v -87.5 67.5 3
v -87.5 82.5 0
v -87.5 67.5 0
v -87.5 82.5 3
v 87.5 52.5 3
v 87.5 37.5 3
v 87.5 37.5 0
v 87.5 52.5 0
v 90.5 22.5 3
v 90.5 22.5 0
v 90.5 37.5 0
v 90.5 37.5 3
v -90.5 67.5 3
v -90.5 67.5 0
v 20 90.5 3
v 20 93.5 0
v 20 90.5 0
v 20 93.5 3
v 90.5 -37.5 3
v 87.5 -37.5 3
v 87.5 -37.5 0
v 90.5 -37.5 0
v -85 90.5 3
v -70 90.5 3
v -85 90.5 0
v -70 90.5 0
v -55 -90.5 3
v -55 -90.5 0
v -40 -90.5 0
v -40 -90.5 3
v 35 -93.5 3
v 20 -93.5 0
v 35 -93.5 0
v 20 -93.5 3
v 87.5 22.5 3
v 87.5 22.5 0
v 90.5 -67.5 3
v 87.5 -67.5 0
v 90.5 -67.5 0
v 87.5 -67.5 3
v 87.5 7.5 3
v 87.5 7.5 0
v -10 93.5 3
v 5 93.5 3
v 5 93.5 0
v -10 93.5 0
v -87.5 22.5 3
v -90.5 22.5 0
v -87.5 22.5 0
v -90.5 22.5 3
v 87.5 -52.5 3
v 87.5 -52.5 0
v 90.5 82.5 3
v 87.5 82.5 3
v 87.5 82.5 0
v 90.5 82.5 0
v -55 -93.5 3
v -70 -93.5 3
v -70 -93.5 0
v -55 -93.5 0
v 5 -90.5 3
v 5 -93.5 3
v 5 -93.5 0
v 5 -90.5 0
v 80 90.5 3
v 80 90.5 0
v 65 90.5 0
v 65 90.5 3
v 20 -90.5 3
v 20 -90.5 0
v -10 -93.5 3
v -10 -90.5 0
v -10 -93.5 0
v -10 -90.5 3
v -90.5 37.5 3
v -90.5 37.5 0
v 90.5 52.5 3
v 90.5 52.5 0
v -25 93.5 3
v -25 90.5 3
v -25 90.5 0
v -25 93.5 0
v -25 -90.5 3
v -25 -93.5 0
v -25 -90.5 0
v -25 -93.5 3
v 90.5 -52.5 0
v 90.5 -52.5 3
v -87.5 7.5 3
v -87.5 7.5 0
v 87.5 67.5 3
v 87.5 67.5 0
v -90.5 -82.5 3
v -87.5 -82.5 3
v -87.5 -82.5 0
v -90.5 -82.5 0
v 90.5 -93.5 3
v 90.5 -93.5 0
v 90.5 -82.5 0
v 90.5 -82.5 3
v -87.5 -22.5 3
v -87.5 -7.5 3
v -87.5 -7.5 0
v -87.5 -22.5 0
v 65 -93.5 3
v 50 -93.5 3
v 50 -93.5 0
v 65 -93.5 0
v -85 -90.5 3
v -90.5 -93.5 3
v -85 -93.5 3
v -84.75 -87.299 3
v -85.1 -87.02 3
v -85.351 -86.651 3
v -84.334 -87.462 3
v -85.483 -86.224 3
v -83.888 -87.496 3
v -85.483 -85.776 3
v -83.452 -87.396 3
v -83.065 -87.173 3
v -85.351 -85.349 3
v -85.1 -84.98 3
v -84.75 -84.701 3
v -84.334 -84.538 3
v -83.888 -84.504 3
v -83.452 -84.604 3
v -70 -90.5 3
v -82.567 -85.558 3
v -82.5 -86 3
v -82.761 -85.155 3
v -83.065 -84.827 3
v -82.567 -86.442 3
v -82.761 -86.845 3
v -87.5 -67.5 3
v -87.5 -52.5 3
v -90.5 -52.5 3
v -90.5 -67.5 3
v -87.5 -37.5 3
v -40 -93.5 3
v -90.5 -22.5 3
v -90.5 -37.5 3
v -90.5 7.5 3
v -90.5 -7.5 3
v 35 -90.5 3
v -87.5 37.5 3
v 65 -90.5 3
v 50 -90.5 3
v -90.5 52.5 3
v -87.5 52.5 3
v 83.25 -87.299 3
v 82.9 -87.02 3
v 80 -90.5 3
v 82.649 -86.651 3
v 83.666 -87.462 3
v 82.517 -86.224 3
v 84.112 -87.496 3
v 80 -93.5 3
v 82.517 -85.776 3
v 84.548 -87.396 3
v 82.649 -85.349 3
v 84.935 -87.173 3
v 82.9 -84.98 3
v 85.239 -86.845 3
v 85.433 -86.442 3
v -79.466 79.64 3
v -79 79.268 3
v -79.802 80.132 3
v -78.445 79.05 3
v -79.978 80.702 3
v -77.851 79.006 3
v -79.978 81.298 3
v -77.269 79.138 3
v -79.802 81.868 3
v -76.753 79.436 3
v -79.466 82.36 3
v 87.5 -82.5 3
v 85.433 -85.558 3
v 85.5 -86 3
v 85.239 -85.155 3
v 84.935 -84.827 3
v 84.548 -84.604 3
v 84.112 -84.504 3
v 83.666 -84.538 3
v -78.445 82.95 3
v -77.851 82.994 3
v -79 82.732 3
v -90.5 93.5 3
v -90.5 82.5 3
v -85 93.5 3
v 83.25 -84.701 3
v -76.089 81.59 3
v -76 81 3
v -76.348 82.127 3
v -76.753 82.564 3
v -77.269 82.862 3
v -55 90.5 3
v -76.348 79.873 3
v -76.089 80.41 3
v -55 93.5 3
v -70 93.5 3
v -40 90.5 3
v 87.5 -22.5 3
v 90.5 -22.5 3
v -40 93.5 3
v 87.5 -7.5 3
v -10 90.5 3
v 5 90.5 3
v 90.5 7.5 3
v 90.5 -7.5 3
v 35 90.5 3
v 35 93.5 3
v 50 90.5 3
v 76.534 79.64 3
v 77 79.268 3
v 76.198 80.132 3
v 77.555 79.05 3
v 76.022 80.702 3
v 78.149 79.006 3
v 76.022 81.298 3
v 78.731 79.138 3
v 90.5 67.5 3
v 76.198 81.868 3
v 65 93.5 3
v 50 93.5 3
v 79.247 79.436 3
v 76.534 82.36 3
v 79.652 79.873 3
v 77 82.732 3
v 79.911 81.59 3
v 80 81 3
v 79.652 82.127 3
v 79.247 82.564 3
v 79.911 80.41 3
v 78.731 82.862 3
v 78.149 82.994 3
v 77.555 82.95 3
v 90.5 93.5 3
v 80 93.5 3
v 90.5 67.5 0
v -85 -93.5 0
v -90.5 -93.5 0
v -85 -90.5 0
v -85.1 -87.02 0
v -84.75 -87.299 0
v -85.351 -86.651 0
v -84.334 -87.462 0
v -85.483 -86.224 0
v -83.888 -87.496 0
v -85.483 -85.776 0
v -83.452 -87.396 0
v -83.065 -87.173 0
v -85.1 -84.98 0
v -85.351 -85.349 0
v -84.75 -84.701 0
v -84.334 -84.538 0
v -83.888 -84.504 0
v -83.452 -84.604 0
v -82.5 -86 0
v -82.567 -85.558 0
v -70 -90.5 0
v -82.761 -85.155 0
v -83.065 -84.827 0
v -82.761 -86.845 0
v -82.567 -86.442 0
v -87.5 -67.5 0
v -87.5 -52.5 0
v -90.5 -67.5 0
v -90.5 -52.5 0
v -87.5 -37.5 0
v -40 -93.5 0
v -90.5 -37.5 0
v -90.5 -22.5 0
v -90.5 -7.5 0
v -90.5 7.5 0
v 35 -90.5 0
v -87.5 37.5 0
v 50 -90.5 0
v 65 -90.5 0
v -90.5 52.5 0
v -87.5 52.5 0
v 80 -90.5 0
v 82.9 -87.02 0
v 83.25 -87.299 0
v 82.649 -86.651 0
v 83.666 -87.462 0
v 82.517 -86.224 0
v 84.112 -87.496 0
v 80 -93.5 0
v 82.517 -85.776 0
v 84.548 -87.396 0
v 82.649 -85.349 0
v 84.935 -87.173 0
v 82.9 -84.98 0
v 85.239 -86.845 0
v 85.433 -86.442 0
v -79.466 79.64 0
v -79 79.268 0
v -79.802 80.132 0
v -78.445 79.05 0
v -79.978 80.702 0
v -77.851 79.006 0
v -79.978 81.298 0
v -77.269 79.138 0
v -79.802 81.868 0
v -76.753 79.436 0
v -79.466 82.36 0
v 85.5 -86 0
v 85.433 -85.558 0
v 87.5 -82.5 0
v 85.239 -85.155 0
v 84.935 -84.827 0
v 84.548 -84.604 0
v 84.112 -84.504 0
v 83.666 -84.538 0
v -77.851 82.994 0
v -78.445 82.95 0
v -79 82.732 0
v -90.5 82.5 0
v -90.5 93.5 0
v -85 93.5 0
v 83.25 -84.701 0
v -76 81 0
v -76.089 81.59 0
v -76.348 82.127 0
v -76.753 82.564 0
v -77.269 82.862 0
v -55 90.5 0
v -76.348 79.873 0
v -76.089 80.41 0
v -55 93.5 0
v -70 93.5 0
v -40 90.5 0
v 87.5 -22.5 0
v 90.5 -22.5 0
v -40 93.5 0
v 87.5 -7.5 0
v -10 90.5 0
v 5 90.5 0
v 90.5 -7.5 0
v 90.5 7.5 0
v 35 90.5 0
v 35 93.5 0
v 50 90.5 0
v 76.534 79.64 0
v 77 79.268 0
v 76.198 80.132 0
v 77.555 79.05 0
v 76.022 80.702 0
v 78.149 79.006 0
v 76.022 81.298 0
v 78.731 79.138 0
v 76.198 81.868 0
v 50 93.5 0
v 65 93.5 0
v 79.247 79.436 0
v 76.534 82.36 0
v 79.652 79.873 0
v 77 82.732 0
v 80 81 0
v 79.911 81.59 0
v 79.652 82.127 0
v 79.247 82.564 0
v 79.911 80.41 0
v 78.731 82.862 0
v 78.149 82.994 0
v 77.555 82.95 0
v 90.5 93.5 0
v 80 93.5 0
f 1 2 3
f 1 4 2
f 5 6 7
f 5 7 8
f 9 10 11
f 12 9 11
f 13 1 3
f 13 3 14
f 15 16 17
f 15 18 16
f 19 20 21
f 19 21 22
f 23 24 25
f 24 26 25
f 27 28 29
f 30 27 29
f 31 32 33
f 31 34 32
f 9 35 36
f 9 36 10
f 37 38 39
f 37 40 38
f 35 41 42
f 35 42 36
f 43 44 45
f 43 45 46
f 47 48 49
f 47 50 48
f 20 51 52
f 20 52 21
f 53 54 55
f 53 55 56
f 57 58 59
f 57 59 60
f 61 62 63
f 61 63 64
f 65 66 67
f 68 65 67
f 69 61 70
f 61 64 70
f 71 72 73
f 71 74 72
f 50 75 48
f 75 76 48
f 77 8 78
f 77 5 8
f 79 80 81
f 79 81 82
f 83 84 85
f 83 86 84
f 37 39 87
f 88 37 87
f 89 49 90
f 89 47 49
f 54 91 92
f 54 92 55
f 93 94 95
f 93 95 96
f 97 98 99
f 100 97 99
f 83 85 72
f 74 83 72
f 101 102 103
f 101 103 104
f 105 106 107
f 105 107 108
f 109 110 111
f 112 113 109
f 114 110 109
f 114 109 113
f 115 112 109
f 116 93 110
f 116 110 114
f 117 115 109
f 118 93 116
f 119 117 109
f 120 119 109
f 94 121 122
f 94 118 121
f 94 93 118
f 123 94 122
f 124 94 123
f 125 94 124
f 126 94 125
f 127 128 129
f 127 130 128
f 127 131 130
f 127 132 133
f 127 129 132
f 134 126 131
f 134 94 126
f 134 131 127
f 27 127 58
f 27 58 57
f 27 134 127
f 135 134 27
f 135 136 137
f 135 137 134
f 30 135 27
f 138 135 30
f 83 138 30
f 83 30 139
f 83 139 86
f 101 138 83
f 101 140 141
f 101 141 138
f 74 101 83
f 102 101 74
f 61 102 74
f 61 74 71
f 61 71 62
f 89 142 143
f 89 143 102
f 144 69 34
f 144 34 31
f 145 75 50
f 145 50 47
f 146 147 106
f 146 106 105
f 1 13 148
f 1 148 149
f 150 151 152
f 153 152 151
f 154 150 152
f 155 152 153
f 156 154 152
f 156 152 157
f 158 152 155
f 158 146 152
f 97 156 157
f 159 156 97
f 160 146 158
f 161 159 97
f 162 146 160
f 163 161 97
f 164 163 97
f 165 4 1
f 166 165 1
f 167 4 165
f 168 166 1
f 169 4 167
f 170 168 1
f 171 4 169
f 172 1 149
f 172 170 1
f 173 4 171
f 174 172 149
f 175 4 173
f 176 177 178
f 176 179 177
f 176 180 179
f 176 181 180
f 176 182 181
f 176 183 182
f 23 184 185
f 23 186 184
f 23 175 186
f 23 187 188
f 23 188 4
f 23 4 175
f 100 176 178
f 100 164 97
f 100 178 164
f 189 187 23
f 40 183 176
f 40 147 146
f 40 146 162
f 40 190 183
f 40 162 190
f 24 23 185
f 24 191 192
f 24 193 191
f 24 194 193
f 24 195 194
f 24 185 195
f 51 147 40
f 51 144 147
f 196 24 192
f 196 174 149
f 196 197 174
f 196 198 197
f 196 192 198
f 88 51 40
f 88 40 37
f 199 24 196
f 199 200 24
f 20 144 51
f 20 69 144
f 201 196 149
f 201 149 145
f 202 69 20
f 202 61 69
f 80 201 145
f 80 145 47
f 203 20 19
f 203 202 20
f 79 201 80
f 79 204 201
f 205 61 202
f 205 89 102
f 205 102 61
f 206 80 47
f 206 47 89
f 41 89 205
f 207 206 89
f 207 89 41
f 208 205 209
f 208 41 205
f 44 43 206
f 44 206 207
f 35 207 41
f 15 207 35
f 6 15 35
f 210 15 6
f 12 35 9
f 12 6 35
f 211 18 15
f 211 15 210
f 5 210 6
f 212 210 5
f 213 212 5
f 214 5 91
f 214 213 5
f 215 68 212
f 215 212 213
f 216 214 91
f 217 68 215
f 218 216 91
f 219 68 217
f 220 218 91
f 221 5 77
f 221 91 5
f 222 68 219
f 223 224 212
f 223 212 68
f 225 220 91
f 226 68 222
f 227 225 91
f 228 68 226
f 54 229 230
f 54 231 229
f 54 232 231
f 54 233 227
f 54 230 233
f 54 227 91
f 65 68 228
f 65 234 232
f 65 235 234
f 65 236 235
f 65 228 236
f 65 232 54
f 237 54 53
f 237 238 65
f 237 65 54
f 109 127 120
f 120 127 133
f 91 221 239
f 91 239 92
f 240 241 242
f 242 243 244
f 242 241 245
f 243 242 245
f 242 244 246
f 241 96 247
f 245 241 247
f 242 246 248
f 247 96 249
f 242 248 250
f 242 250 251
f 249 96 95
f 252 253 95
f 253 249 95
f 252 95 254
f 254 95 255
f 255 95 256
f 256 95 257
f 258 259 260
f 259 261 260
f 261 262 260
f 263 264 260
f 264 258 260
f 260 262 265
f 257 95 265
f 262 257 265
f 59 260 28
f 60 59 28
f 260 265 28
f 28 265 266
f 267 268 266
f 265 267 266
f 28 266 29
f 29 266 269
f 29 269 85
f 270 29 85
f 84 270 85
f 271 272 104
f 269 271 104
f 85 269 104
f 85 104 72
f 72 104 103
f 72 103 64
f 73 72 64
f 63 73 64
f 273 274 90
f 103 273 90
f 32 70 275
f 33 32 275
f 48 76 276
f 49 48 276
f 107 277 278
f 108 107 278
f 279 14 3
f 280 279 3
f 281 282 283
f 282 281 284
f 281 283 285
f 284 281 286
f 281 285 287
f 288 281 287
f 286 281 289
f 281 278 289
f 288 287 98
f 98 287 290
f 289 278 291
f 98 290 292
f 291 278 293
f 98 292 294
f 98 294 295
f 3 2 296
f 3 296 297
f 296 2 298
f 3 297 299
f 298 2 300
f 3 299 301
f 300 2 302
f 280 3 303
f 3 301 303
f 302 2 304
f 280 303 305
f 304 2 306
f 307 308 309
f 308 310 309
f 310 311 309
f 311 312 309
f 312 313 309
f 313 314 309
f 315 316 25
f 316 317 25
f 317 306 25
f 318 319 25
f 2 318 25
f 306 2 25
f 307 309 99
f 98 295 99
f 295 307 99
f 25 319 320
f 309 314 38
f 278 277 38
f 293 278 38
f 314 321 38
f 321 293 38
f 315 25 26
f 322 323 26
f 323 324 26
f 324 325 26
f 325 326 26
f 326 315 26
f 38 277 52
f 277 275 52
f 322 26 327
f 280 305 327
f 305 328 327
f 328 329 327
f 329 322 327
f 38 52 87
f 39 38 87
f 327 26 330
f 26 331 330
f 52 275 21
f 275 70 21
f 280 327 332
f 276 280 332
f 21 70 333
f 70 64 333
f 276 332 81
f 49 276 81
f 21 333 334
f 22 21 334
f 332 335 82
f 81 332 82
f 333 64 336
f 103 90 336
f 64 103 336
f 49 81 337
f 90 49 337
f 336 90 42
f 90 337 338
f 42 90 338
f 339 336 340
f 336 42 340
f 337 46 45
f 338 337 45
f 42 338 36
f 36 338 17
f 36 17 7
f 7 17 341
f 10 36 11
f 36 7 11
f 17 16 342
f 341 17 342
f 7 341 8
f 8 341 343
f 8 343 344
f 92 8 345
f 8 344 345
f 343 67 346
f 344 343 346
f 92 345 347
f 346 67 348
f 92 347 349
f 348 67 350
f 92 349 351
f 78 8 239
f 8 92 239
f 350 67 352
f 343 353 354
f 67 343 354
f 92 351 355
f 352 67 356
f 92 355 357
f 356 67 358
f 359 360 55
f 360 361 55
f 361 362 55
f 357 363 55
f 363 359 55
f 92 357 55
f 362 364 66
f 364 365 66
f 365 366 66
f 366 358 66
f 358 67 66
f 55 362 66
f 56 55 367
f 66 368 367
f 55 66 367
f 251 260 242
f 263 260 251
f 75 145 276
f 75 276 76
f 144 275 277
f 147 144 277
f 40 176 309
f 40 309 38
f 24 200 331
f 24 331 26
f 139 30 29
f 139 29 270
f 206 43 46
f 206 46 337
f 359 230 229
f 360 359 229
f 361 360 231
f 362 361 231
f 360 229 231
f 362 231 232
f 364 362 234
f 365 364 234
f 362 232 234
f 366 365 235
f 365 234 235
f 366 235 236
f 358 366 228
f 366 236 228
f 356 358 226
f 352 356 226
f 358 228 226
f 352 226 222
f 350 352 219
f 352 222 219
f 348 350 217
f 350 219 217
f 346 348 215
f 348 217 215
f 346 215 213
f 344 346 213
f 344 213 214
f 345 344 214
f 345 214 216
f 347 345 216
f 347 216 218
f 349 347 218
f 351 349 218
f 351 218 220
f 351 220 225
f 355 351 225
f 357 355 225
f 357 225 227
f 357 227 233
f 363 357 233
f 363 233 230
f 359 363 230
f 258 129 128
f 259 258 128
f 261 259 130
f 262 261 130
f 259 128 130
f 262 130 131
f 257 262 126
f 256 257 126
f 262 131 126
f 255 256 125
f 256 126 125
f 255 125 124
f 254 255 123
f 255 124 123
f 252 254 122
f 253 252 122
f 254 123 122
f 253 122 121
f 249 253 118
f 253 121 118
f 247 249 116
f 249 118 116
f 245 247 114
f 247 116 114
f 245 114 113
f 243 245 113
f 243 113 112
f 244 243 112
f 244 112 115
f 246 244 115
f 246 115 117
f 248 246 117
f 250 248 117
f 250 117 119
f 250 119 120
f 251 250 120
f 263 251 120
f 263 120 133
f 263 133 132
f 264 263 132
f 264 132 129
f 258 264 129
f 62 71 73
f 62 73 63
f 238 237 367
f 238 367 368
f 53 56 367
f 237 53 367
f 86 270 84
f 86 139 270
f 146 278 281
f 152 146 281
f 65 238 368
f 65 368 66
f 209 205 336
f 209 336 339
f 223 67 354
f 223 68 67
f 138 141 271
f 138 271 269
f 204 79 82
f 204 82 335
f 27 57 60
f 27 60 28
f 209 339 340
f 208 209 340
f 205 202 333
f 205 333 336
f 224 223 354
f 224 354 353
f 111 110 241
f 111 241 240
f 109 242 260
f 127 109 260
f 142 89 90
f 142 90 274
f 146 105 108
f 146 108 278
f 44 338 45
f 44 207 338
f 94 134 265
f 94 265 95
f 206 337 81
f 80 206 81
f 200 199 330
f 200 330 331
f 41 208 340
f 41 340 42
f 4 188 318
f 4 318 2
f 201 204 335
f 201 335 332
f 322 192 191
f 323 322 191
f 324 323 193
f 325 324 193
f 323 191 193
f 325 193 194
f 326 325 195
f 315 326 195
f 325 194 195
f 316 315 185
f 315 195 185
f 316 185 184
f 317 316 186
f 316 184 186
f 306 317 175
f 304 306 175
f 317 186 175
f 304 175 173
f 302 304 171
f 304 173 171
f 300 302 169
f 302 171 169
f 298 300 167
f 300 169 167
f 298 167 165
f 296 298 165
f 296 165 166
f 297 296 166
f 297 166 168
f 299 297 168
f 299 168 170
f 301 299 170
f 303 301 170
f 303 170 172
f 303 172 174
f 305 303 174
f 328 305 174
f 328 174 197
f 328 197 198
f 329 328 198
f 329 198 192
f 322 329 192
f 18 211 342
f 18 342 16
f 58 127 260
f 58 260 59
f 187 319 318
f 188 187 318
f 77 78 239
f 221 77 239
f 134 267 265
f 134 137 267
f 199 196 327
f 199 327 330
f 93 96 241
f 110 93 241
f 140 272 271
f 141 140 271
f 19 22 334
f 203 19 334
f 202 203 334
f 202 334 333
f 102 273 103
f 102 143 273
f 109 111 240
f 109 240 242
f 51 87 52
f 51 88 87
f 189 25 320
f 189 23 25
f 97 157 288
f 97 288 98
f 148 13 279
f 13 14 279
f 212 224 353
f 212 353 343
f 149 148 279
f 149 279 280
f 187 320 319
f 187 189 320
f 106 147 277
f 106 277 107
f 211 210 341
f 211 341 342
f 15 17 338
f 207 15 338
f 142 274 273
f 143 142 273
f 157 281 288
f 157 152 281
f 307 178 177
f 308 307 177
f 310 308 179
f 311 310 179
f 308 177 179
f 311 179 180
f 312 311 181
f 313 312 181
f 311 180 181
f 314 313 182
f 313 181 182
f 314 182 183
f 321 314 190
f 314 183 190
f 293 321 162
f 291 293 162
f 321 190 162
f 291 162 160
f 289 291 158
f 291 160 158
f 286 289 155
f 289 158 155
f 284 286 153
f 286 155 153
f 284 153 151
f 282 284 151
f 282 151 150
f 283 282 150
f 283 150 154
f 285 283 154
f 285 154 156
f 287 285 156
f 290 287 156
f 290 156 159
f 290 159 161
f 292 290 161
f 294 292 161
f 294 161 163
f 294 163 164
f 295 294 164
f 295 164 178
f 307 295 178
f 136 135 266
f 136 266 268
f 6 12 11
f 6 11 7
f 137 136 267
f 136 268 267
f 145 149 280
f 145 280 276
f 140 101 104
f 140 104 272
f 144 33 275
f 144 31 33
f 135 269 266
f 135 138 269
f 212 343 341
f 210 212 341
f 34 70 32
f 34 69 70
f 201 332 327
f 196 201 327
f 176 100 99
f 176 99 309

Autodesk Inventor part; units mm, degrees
ref_plane "YZ Plane" through (0, 0, 0) normal (1, 0, 0) x (0, 1, 0)
ref_plane "XZ Plane" through (0, 0, 0) normal (0, 1, 0) x (-1, 0, 0)
ref_plane "XY Plane" through (0, 0, 0) normal (0, 0, 1) x (1, 0, 0)
sketch "Sketch1" plane through (0, 0, 0) normal (0, 0, 1) x (1, 0, 0)
  line L0 (-90.5, -90.5) -> (90.5, -90.5)
  line L1 (90.5, -90.5) -> (90.5, 90.5)
  line L2 (90.5, 90.5) -> (-90.5, 90.5)
  line L3 (-90.5, 90.5) -> (-90.5, -90.5)
  line L4 (-90.5, -90.5) -> (90.5, 90.5) construction
  line L5 (90.5, -90.5) -> (-90.5, 90.5) construction
  point P0 (0, 0)
  dimension "d0" = 181
  dimension "d1" = 181
extrude "Extrusion1" add sketch "Sketch1" along normal blind 3
sketch "Sketch2" plane through (0, 0, 3) normal (0, 0, 1) x (1, 0, 0)
  line L0 (90.5, 90.5) -> (-90.5, 90.5) projected
  line L1 (-90.5, 90.5) -> (-85, 90.5)
  line L2 (-85, 90.5) -> (-85, 93.5)
  line L3 (-85, 93.5) -> (-90.5, 93.5)
  line L4 (-90.5, 93.5) -> (-90.5, 90.5)
  line L5 (80, 90.5) -> (85.5, 90.5)
  line L6 (85.5, 90.5) -> (85.5, 93.5)
  line L7 (85.5, 93.5) -> (80, 93.5)
  line L8 (80, 93.5) -> (80, 90.5)
  line L9 (-90.5, -93.5) -> (-85, -93.5)
  line L10 (-85, -93.5) -> (-85, -90.5)
  line L11 (-85, -90.5) -> (-90.5, -90.5)
  line L12 (-90.5, -90.5) -> (-90.5, -93.5)
  line L13 (80, -93.5) -> (85.5, -93.5)
  line L14 (85.5, -93.5) -> (85.5, -90.5)
  line L15 (85.5, -90.5) -> (80, -90.5)
  line L16 (80, -90.5) -> (80, -93.5)
  line L17 (-70, 90.5) -> (-55, 90.5)
  line L18 (-55, 90.5) -> (-55, 93.5)
  line L19 (-55, 93.5) -> (-70, 93.5)
  line L20 (-70, 93.5) -> (-70, 90.5)
  line L21 (-25, 90.5) -> (-25, 93.5)
  line L22 (-40, 90.5) -> (-25, 90.5)
  line L23 (-25, 93.5) -> (-40, 93.5)
  line L24 (-40, 93.5) -> (-40, 90.5)
  line L25 (5, 90.5) -> (5, 93.5)
  line L26 (-10, 90.5) -> (5, 90.5)
  line L27 (5, 93.5) -> (-10, 93.5)
  line L28 (-10, 93.5) -> (-10, 90.5)
  line L29 (35, 90.5) -> (35, 93.5)
  line L30 (20, 90.5) -> (35, 90.5)
  line L31 (35, 93.5) -> (20, 93.5)
  line L32 (20, 93.5) -> (20, 90.5)
  line L33 (65, 90.5) -> (65, 93.5)
  line L34 (50, 90.5) -> (65, 90.5)
  line L35 (65, 93.5) -> (50, 93.5)
  line L36 (50, 93.5) -> (50, 90.5)
  line L37 (-55, -93.5) -> (-55, -90.5)
  line L38 (-70, -93.5) -> (-55, -93.5)
  line L39 (-55, -90.5) -> (-70, -90.5)
  line L40 (-70, -90.5) -> (-70, -93.5)
  line L41 (-25, -93.5) -> (-25, -90.5)
  line L42 (-40, -93.5) -> (-25, -93.5)
  line L43 (-25, -90.5) -> (-40, -90.5)
  line L44 (-40, -90.5) -> (-40, -93.5)
  line L45 (5, -93.5) -> (5, -90.5)
  line L46 (-10, -93.5) -> (5, -93.5)
  line L47 (5, -90.5) -> (-10, -90.5)
  line L48 (-10, -90.5) -> (-10, -93.5)
  line L49 (35, -93.5) -> (35, -90.5)
  line L50 (20, -93.5) -> (35, -93.5)
  line L51 (35, -90.5) -> (20, -90.5)
  line L52 (20, -90.5) -> (20, -93.5)
  line L53 (65, -93.5) -> (65, -90.5)
  line L54 (50, -93.5) -> (65, -93.5)
  line L55 (65, -90.5) -> (50, -90.5)
  line L56 (50, -90.5) -> (50, -93.5)
  point P0 (0, 0)
  dimension "d4" = 5.5
  dimension "d5" = 3
  dimension "d8" = 170.5
  dimension "d11" = 184
  dimension "d14" = 15
  dimension "d15" = 3
  dimension "d16" = 15
  dimension "d19" = 30
  dimension "d22" = 184
extrude "Extrusion2" add sketch "Sketch2" against normal blind 3
sketch "Sketch3" plane through (0, 0, 3) normal (0, 0, 1) x (1, 0, 0)
  line L0 (-90.5, 93.5) -> (-90.5, -93.5) projected
  line L1 (-90.5, 82.5) -> (-87.5, 82.5)
  line L2 (-87.5, 82.5) -> (-87.5, 67.5)
  line L3 (-87.5, 67.5) -> (-90.5, 67.5)
  line L4 (-90.5, 67.5) -> (-90.5, 82.5)
  line L5 (-85, 93.5) -> (-90.5, 93.5) projected
  line L6 (-90.5, 52.5) -> (-87.5, 52.5)
  line L7 (-87.5, 52.5) -> (-87.5, 37.5)
  line L8 (-87.5, 37.5) -> (-90.5, 37.5)
  line L9 (-90.5, 37.5) -> (-90.5, 52.5)
  line L10 (-90.5, 22.5) -> (-87.5, 22.5)
  line L11 (-87.5, 22.5) -> (-87.5, 7.5)
  line L12 (-87.5, 7.5) -> (-90.5, 7.5)
  line L13 (-90.5, 7.5) -> (-90.5, 22.5)
  line L14 (-90.5, -7.5) -> (-87.5, -7.5)
  line L15 (-87.5, -7.5) -> (-87.5, -22.5)
  line L16 (-87.5, -22.5) -> (-90.5, -22.5)
  line L17 (-90.5, -22.5) -> (-90.5, -7.5)
  line L18 (-90.5, -37.5) -> (-87.5, -37.5)
  line L19 (-87.5, -37.5) -> (-87.5, -52.5)
  line L20 (-87.5, -52.5) -> (-90.5, -52.5)
  line L21 (-90.5, -52.5) -> (-90.5, -37.5)
  line L22 (-90.5, -67.5) -> (-87.5, -67.5)
  line L23 (-87.5, -67.5) -> (-87.5, -82.5)
  line L24 (-87.5, -82.5) -> (-90.5, -82.5)
  line L25 (-90.5, -82.5) -> (-90.5, -67.5)
  line L26 (87.5, 82.5) -> (90.5, 82.5)
  line L27 (90.5, 82.5) -> (90.5, 67.5)
  line L28 (90.5, 67.5) -> (87.5, 67.5)
  line L29 (87.5, 67.5) -> (87.5, 82.5)
  line L30 (87.5, 52.5) -> (90.5, 52.5)
  line L31 (90.5, 52.5) -> (90.5, 37.5)
  line L32 (90.5, 37.5) -> (87.5, 37.5)
  line L33 (87.5, 37.5) -> (87.5, 52.5)
  line L34 (87.5, 22.5) -> (90.5, 22.5)
  line L35 (90.5, 22.5) -> (90.5, 7.5)
  line L36 (90.5, 7.5) -> (87.5, 7.5)
  line L37 (87.5, 7.5) -> (87.5, 22.5)
  line L38 (87.5, -7.5) -> (90.5, -7.5)
  line L39 (90.5, -7.5) -> (90.5, -22.5)
  line L40 (90.5, -22.5) -> (87.5, -22.5)
  line L41 (87.5, -22.5) -> (87.5, -7.5)
  line L42 (87.5, -37.5) -> (90.5, -37.5)
  line L43 (90.5, -37.5) -> (90.5, -52.5)
  line L44 (90.5, -52.5) -> (87.5, -52.5)
  line L45 (87.5, -52.5) -> (87.5, -37.5)
  line L46 (87.5, -67.5) -> (90.5, -67.5)
  line L47 (90.5, -67.5) -> (90.5, -82.5)
  line L48 (90.5, -82.5) -> (87.5, -82.5)
  line L49 (87.5, -82.5) -> (87.5, -67.5)
  point P0 (0, 0)
  dimension "d27" = 3
  dimension "d28" = 15
  dimension "d29" = 11
  dimension "d32" = 30
  dimension "d35" = 178
extrude "Extrusion3" cut sketch "Sketch3" against normal blind 3
sketch "Sketch4" plane through (0, 0, 3) normal (0, 0, 1) x (1, 0, 0)
  line L0 (80, 93.5) -> (85.5, 93.5) projected
  line L1 (90.5, 90.5) -> (85.5, 90.5) projected
  line L2 (85.5, 93.5) -> (90.5, 93.5)
  line L3 (90.5, 93.5) -> (90.5, 90.5)
  line L4 (90.5, 90.5) -> (85.5, 90.5)
  line L5 (85.5, 90.5) -> (85.5, 93.5)
  line L6 (85.5, -90.5) -> (90.5, -90.5) projected
  line L7 (85.5, -90.5) -> (90.5, -90.5)
  line L8 (90.5, -90.5) -> (90.5, -93.5)
  line L9 (90.5, -93.5) -> (85.5, -93.5)
  line L10 (85.5, -93.5) -> (85.5, -90.5)
  point P0 (0, 0)
  dimension "d40" = 184
extrude "Extrusion4" add sketch "Sketch4" against normal blind 3
sketch "Sketch5" plane through (0, 0, 3) normal (0, 0, 1) x (1, 0, 0)
  circle A0 centre (-84, -86) radius 1.5
  circle A1 centre (84, -86) radius 1.5
  line L0 (90.5, -82.5) -> (90.5, -93.5) projected
  line L1 (90.5, -93.5) -> (80, -93.5) projected
  line L2 (-85, -93.5) -> (-90.5, -93.5) projected
  line L3 (-90.5, -82.5) -> (-90.5, -93.5) projected
  point P0 (0, 0)
  dimension "d43" = 3
  dimension "d44" = 3
  dimension "d45" = 6.5
  dimension "d46" = 7.5
  dimension "d47" = 7.5
  dimension "d48" = 6.5
extrude "Extrusion5" cut sketch "Sketch5" against normal blind 10
sketch "Sketch6" plane through (0, 0, 3) normal (0, 0, 1) x (1, 0, 0)
  circle A0 centre (-78, 81) radius 2
  circle A1 centre (78, 81) radius 2
  line L0 (-87.5, 82.5) -> (-87.5, 67.5) projected
  line L1 (-70, 90.5) -> (-85, 90.5) projected
  line L2 (80, 90.5) -> (65, 90.5) projected
  line L3 (87.5, 67.5) -> (87.5, 82.5) projected
  point P0 (0, 0)
  dimension "d51" = 4
  dimension "d52" = 4
  dimension "d53" = 9.5
  dimension "d54" = 9.5
  dimension "d55" = 9.5
  dimension "d56" = 9.5
extrude "Extrusion6" cut sketch "Sketch6" against normal blind 10
equation "\"d47\" = d46"
equation "\"d48\" = d45"
equation "\"BendRadius\" = Thickness"
equation "\"BendReliefWidth\" = Thickness"
equation "\"BendReliefDepth\" = 0.5 * Thickness"
equation "\"CornerReliefSize\" = 4 * Thickness"
equation "\"MinimumRemnant\" = 2 * Thickness"
equation "\"TransitionRadius\" = BendRadius"
equation "\"JacobiRadiusSize\" = BendRadius"
equation "\"GapSize\" = Thickness"
equation "\"Thickness\" = 0.5"
properties part number "7 achter plaat"
